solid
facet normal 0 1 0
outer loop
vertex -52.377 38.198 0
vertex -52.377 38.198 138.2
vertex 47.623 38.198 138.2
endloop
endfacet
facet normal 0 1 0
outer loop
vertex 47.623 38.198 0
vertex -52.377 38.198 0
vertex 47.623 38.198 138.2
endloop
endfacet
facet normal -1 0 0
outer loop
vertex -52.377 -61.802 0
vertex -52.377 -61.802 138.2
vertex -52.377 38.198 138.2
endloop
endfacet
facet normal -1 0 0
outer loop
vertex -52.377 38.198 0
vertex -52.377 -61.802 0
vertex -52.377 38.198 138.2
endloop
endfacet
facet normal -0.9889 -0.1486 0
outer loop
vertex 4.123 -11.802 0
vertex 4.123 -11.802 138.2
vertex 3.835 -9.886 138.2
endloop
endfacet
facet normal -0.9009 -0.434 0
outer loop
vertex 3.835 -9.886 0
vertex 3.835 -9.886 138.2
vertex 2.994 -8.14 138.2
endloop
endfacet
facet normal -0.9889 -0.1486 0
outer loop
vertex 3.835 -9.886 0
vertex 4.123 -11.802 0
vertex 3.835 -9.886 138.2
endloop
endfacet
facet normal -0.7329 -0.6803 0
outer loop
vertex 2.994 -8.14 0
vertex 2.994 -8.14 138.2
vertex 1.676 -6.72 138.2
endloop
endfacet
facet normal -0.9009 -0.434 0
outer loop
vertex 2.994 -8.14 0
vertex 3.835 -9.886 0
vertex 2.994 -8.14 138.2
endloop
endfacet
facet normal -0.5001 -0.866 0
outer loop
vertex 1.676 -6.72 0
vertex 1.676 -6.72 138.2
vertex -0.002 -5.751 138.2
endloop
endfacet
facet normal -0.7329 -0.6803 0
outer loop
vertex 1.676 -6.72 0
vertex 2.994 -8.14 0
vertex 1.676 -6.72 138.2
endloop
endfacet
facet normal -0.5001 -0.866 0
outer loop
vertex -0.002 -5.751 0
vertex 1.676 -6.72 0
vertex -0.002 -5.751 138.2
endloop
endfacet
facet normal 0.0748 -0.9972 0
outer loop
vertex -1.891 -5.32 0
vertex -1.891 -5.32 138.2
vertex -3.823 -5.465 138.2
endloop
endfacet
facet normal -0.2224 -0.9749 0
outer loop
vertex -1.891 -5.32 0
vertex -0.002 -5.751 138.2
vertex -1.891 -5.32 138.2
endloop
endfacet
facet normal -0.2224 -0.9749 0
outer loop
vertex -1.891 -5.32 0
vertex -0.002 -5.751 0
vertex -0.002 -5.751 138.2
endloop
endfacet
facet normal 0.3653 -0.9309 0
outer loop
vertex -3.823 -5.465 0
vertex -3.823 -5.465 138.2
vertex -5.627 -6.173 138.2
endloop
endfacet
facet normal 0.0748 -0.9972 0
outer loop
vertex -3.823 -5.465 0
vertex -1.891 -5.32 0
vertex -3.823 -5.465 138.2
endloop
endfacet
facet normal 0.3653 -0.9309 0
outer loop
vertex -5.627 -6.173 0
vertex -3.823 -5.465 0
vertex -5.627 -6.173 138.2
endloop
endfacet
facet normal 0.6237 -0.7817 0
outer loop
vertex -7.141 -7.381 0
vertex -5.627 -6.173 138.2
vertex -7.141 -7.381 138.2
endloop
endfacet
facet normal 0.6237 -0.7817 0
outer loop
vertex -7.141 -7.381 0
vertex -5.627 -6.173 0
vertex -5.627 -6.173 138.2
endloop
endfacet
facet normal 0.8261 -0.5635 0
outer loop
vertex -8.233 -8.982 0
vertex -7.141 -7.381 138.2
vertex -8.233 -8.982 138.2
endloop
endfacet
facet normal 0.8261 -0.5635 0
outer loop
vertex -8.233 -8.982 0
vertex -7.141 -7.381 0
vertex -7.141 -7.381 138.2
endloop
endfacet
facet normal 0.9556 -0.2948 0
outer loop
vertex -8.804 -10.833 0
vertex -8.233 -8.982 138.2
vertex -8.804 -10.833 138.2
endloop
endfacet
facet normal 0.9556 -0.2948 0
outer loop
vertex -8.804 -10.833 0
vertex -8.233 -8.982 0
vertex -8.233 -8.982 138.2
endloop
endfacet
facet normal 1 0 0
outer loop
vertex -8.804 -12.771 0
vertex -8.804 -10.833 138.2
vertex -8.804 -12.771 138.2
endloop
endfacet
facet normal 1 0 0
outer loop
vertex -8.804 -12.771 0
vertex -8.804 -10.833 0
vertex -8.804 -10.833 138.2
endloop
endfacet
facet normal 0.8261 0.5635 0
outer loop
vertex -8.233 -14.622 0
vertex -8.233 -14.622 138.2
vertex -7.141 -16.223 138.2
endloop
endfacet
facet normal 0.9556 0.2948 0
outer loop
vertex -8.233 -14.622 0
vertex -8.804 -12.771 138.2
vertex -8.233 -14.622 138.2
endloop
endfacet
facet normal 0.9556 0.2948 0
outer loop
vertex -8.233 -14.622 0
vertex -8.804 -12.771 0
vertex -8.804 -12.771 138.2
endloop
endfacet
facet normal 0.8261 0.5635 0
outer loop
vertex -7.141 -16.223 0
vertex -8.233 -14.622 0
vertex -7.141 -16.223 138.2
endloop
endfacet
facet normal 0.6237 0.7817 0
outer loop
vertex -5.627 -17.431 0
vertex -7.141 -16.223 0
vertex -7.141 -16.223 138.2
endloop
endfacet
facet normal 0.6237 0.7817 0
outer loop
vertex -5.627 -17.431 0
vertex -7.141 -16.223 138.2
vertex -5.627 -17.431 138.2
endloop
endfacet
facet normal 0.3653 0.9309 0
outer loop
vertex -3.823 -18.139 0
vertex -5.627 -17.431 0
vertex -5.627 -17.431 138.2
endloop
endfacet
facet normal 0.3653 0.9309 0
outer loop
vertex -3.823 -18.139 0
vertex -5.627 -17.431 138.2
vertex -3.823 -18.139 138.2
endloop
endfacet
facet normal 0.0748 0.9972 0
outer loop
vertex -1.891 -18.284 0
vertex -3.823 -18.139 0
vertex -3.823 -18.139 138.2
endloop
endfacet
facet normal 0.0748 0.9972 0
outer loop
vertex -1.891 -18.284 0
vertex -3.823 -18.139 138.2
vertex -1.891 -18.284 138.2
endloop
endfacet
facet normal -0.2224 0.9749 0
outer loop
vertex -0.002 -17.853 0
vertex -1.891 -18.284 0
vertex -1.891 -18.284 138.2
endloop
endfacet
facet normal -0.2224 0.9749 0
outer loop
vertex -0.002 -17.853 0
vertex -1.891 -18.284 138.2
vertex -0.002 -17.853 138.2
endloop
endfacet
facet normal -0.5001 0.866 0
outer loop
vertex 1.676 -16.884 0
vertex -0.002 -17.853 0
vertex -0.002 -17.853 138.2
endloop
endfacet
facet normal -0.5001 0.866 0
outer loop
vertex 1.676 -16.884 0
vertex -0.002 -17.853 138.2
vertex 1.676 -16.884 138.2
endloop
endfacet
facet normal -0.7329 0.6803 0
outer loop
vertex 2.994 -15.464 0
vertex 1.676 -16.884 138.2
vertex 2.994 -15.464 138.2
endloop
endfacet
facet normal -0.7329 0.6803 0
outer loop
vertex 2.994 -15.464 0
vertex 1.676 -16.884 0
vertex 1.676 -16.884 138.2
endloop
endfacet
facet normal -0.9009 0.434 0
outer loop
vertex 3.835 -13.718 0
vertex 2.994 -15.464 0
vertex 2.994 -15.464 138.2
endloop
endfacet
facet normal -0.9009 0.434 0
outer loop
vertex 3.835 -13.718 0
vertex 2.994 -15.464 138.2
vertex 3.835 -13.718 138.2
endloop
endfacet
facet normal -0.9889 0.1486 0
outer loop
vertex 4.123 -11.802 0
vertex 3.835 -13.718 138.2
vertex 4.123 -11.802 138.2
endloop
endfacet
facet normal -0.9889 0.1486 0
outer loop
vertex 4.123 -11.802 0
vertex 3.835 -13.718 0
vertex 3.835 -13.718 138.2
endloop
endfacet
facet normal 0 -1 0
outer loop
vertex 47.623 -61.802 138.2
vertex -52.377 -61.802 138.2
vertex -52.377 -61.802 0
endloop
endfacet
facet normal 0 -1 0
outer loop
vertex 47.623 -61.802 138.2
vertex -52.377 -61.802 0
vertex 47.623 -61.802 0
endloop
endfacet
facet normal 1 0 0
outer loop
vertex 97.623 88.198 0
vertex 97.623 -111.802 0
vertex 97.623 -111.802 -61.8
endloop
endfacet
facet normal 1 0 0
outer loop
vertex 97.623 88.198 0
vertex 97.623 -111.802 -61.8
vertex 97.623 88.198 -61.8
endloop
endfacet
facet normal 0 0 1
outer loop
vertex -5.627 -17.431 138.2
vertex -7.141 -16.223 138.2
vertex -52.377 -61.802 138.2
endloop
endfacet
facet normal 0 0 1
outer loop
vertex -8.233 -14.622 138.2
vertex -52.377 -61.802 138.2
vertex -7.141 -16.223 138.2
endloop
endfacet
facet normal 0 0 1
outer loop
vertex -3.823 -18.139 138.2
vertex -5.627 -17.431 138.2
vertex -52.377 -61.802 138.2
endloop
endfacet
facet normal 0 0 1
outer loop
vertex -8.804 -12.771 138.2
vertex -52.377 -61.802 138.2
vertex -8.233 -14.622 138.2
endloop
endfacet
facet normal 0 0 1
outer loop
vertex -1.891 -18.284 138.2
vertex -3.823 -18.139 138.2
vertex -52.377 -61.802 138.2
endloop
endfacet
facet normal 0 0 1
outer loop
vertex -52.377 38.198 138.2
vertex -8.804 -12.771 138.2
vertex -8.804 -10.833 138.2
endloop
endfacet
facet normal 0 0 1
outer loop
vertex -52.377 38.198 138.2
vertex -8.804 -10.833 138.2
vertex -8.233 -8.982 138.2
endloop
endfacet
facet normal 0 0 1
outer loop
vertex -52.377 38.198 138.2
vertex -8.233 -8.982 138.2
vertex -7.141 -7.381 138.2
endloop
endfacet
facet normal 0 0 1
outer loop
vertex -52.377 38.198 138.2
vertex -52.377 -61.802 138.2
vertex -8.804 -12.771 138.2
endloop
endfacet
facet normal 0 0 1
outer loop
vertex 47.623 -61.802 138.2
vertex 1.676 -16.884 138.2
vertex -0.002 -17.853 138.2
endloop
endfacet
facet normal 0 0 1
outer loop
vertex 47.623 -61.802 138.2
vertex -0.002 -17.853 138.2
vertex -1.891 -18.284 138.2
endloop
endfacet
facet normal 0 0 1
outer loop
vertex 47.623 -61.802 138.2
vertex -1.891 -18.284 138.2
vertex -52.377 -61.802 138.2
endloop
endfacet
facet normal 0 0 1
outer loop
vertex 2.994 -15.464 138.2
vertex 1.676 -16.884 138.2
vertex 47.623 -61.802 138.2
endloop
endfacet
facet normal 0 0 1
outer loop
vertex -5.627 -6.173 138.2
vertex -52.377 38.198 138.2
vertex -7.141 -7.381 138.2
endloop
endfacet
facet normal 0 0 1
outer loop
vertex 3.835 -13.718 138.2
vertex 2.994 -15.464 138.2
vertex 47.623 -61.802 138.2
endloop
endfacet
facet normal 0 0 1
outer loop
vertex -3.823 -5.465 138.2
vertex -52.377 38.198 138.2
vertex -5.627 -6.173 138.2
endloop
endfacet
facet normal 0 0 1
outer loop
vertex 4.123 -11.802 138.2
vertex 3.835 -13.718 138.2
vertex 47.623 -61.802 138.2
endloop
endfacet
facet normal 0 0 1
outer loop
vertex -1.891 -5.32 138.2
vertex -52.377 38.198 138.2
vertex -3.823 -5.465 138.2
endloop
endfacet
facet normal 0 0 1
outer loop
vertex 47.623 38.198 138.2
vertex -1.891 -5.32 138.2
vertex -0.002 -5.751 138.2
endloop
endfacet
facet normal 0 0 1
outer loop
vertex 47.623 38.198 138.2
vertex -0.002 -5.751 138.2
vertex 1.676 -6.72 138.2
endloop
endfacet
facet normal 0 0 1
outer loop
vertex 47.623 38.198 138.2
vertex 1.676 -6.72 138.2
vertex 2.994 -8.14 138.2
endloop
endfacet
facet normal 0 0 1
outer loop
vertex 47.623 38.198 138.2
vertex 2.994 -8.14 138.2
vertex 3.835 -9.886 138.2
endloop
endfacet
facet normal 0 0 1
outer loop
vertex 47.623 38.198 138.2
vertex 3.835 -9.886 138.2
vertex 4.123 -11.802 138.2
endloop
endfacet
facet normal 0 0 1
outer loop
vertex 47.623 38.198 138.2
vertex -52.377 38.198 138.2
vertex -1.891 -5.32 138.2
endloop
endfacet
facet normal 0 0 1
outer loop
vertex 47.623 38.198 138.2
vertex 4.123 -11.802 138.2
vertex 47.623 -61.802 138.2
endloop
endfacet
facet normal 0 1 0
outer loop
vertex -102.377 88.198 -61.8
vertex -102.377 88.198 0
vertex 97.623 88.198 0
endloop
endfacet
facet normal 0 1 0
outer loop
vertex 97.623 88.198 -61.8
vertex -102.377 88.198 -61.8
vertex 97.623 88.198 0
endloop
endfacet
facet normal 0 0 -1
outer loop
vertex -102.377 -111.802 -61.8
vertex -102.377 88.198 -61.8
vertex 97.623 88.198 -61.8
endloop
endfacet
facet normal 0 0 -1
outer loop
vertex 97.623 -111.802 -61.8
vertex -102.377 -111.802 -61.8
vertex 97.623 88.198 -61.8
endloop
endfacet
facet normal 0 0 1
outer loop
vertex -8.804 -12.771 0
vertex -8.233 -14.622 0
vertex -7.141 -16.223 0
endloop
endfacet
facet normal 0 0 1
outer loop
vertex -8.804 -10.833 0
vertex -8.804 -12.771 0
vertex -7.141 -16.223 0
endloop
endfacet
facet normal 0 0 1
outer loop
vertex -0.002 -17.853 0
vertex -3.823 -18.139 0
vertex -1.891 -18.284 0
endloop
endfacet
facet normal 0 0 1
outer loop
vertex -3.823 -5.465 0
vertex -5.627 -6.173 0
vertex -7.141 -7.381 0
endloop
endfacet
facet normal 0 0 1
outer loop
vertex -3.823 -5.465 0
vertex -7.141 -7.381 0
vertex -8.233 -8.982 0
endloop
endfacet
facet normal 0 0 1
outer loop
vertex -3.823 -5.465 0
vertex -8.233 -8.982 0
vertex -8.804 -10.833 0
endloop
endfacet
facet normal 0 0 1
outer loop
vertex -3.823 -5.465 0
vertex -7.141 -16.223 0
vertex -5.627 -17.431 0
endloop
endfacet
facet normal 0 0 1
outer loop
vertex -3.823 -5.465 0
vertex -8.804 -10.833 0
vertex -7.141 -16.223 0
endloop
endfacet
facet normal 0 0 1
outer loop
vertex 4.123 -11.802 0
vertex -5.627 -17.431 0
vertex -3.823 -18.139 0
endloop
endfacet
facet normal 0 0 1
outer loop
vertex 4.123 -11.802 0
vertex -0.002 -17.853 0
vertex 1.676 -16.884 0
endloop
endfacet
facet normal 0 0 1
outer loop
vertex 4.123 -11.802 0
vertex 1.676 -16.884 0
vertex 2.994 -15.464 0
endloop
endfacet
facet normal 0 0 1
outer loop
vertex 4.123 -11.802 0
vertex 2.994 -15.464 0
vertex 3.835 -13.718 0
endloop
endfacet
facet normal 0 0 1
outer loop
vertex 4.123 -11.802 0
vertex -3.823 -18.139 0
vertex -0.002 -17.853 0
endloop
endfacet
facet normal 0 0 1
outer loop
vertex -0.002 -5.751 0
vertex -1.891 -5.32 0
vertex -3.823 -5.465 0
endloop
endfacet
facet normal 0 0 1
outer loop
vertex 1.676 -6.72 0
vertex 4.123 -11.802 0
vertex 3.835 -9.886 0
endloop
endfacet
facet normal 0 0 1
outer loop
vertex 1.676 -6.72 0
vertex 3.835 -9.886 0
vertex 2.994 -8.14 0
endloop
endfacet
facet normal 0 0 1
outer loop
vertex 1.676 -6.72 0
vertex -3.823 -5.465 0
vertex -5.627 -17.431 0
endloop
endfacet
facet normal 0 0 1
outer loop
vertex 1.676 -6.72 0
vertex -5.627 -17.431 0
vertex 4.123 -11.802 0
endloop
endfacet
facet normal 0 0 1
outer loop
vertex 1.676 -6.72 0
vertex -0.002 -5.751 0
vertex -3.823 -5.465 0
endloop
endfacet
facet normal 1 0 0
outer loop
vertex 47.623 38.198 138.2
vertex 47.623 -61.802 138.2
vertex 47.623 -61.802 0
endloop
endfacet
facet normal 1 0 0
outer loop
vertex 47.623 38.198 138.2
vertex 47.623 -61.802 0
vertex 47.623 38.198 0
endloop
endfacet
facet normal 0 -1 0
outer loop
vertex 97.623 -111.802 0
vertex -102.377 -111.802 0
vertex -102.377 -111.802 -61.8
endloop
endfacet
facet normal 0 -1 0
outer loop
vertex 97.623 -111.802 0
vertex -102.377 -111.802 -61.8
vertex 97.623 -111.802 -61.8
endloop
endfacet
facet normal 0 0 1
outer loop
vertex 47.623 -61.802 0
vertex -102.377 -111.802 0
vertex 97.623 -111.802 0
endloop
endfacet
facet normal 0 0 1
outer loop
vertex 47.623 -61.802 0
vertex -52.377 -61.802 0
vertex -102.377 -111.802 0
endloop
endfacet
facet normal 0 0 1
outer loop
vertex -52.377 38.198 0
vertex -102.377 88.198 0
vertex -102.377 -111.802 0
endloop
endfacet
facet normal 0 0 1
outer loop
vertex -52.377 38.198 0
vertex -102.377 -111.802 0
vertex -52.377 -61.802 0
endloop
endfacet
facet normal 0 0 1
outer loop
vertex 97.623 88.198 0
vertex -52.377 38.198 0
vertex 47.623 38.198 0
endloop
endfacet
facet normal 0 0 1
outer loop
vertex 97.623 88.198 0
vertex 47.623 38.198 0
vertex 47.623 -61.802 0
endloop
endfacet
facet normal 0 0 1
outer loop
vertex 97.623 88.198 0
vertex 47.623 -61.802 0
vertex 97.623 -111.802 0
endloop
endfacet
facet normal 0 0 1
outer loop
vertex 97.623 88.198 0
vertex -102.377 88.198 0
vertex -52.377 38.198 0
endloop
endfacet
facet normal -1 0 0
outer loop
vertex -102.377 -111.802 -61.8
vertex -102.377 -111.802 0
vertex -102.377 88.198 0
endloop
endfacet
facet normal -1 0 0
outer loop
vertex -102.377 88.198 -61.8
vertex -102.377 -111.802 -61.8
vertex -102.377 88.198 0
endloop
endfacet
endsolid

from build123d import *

# Parameters (mm, degrees)
SKETCH_1_W          = 100
SKETCH_1_H          = 100
EXTRUDE_2_DEPTH     = 138.2
SKETCH_1_4_W        = 200
SKETCH_1_4_H        = 200
EXTRUDE_3_DEPTH     = 61.8
SKETCH_1_5_R        = 6.5
CUT_EXTRUDE_1_DEPTH = 177.8


with BuildPart() as part:
    # 草图1 → 凸台-拉伸2 (new body)
    with BuildSketch(Plane.XY):
        with Locations((-2.376531009, -11.802029242)):
            Rectangle(SKETCH_1_W, SKETCH_1_H)
    extrude(amount=EXTRUDE_2_DEPTH)

    # 草图1<4> → 凸台-拉伸3 (add)
    with BuildSketch(Plane.XY):
        with Locations((-2.376531009, -11.802029242)):
            Rectangle(SKETCH_1_4_W, SKETCH_1_4_H)
    extrude(amount=-EXTRUDE_3_DEPTH)

    # 草图1<5> → 切除-拉伸1 (cut)
    with BuildSketch(Plane.XY):
        with Locations((-2.376531009, -11.802029242)):
            Circle(SKETCH_1_5_R)
    extrude(amount=CUT_EXTRUDE_1_DEPTH, mode=Mode.SUBTRACT)


solid = part.part
